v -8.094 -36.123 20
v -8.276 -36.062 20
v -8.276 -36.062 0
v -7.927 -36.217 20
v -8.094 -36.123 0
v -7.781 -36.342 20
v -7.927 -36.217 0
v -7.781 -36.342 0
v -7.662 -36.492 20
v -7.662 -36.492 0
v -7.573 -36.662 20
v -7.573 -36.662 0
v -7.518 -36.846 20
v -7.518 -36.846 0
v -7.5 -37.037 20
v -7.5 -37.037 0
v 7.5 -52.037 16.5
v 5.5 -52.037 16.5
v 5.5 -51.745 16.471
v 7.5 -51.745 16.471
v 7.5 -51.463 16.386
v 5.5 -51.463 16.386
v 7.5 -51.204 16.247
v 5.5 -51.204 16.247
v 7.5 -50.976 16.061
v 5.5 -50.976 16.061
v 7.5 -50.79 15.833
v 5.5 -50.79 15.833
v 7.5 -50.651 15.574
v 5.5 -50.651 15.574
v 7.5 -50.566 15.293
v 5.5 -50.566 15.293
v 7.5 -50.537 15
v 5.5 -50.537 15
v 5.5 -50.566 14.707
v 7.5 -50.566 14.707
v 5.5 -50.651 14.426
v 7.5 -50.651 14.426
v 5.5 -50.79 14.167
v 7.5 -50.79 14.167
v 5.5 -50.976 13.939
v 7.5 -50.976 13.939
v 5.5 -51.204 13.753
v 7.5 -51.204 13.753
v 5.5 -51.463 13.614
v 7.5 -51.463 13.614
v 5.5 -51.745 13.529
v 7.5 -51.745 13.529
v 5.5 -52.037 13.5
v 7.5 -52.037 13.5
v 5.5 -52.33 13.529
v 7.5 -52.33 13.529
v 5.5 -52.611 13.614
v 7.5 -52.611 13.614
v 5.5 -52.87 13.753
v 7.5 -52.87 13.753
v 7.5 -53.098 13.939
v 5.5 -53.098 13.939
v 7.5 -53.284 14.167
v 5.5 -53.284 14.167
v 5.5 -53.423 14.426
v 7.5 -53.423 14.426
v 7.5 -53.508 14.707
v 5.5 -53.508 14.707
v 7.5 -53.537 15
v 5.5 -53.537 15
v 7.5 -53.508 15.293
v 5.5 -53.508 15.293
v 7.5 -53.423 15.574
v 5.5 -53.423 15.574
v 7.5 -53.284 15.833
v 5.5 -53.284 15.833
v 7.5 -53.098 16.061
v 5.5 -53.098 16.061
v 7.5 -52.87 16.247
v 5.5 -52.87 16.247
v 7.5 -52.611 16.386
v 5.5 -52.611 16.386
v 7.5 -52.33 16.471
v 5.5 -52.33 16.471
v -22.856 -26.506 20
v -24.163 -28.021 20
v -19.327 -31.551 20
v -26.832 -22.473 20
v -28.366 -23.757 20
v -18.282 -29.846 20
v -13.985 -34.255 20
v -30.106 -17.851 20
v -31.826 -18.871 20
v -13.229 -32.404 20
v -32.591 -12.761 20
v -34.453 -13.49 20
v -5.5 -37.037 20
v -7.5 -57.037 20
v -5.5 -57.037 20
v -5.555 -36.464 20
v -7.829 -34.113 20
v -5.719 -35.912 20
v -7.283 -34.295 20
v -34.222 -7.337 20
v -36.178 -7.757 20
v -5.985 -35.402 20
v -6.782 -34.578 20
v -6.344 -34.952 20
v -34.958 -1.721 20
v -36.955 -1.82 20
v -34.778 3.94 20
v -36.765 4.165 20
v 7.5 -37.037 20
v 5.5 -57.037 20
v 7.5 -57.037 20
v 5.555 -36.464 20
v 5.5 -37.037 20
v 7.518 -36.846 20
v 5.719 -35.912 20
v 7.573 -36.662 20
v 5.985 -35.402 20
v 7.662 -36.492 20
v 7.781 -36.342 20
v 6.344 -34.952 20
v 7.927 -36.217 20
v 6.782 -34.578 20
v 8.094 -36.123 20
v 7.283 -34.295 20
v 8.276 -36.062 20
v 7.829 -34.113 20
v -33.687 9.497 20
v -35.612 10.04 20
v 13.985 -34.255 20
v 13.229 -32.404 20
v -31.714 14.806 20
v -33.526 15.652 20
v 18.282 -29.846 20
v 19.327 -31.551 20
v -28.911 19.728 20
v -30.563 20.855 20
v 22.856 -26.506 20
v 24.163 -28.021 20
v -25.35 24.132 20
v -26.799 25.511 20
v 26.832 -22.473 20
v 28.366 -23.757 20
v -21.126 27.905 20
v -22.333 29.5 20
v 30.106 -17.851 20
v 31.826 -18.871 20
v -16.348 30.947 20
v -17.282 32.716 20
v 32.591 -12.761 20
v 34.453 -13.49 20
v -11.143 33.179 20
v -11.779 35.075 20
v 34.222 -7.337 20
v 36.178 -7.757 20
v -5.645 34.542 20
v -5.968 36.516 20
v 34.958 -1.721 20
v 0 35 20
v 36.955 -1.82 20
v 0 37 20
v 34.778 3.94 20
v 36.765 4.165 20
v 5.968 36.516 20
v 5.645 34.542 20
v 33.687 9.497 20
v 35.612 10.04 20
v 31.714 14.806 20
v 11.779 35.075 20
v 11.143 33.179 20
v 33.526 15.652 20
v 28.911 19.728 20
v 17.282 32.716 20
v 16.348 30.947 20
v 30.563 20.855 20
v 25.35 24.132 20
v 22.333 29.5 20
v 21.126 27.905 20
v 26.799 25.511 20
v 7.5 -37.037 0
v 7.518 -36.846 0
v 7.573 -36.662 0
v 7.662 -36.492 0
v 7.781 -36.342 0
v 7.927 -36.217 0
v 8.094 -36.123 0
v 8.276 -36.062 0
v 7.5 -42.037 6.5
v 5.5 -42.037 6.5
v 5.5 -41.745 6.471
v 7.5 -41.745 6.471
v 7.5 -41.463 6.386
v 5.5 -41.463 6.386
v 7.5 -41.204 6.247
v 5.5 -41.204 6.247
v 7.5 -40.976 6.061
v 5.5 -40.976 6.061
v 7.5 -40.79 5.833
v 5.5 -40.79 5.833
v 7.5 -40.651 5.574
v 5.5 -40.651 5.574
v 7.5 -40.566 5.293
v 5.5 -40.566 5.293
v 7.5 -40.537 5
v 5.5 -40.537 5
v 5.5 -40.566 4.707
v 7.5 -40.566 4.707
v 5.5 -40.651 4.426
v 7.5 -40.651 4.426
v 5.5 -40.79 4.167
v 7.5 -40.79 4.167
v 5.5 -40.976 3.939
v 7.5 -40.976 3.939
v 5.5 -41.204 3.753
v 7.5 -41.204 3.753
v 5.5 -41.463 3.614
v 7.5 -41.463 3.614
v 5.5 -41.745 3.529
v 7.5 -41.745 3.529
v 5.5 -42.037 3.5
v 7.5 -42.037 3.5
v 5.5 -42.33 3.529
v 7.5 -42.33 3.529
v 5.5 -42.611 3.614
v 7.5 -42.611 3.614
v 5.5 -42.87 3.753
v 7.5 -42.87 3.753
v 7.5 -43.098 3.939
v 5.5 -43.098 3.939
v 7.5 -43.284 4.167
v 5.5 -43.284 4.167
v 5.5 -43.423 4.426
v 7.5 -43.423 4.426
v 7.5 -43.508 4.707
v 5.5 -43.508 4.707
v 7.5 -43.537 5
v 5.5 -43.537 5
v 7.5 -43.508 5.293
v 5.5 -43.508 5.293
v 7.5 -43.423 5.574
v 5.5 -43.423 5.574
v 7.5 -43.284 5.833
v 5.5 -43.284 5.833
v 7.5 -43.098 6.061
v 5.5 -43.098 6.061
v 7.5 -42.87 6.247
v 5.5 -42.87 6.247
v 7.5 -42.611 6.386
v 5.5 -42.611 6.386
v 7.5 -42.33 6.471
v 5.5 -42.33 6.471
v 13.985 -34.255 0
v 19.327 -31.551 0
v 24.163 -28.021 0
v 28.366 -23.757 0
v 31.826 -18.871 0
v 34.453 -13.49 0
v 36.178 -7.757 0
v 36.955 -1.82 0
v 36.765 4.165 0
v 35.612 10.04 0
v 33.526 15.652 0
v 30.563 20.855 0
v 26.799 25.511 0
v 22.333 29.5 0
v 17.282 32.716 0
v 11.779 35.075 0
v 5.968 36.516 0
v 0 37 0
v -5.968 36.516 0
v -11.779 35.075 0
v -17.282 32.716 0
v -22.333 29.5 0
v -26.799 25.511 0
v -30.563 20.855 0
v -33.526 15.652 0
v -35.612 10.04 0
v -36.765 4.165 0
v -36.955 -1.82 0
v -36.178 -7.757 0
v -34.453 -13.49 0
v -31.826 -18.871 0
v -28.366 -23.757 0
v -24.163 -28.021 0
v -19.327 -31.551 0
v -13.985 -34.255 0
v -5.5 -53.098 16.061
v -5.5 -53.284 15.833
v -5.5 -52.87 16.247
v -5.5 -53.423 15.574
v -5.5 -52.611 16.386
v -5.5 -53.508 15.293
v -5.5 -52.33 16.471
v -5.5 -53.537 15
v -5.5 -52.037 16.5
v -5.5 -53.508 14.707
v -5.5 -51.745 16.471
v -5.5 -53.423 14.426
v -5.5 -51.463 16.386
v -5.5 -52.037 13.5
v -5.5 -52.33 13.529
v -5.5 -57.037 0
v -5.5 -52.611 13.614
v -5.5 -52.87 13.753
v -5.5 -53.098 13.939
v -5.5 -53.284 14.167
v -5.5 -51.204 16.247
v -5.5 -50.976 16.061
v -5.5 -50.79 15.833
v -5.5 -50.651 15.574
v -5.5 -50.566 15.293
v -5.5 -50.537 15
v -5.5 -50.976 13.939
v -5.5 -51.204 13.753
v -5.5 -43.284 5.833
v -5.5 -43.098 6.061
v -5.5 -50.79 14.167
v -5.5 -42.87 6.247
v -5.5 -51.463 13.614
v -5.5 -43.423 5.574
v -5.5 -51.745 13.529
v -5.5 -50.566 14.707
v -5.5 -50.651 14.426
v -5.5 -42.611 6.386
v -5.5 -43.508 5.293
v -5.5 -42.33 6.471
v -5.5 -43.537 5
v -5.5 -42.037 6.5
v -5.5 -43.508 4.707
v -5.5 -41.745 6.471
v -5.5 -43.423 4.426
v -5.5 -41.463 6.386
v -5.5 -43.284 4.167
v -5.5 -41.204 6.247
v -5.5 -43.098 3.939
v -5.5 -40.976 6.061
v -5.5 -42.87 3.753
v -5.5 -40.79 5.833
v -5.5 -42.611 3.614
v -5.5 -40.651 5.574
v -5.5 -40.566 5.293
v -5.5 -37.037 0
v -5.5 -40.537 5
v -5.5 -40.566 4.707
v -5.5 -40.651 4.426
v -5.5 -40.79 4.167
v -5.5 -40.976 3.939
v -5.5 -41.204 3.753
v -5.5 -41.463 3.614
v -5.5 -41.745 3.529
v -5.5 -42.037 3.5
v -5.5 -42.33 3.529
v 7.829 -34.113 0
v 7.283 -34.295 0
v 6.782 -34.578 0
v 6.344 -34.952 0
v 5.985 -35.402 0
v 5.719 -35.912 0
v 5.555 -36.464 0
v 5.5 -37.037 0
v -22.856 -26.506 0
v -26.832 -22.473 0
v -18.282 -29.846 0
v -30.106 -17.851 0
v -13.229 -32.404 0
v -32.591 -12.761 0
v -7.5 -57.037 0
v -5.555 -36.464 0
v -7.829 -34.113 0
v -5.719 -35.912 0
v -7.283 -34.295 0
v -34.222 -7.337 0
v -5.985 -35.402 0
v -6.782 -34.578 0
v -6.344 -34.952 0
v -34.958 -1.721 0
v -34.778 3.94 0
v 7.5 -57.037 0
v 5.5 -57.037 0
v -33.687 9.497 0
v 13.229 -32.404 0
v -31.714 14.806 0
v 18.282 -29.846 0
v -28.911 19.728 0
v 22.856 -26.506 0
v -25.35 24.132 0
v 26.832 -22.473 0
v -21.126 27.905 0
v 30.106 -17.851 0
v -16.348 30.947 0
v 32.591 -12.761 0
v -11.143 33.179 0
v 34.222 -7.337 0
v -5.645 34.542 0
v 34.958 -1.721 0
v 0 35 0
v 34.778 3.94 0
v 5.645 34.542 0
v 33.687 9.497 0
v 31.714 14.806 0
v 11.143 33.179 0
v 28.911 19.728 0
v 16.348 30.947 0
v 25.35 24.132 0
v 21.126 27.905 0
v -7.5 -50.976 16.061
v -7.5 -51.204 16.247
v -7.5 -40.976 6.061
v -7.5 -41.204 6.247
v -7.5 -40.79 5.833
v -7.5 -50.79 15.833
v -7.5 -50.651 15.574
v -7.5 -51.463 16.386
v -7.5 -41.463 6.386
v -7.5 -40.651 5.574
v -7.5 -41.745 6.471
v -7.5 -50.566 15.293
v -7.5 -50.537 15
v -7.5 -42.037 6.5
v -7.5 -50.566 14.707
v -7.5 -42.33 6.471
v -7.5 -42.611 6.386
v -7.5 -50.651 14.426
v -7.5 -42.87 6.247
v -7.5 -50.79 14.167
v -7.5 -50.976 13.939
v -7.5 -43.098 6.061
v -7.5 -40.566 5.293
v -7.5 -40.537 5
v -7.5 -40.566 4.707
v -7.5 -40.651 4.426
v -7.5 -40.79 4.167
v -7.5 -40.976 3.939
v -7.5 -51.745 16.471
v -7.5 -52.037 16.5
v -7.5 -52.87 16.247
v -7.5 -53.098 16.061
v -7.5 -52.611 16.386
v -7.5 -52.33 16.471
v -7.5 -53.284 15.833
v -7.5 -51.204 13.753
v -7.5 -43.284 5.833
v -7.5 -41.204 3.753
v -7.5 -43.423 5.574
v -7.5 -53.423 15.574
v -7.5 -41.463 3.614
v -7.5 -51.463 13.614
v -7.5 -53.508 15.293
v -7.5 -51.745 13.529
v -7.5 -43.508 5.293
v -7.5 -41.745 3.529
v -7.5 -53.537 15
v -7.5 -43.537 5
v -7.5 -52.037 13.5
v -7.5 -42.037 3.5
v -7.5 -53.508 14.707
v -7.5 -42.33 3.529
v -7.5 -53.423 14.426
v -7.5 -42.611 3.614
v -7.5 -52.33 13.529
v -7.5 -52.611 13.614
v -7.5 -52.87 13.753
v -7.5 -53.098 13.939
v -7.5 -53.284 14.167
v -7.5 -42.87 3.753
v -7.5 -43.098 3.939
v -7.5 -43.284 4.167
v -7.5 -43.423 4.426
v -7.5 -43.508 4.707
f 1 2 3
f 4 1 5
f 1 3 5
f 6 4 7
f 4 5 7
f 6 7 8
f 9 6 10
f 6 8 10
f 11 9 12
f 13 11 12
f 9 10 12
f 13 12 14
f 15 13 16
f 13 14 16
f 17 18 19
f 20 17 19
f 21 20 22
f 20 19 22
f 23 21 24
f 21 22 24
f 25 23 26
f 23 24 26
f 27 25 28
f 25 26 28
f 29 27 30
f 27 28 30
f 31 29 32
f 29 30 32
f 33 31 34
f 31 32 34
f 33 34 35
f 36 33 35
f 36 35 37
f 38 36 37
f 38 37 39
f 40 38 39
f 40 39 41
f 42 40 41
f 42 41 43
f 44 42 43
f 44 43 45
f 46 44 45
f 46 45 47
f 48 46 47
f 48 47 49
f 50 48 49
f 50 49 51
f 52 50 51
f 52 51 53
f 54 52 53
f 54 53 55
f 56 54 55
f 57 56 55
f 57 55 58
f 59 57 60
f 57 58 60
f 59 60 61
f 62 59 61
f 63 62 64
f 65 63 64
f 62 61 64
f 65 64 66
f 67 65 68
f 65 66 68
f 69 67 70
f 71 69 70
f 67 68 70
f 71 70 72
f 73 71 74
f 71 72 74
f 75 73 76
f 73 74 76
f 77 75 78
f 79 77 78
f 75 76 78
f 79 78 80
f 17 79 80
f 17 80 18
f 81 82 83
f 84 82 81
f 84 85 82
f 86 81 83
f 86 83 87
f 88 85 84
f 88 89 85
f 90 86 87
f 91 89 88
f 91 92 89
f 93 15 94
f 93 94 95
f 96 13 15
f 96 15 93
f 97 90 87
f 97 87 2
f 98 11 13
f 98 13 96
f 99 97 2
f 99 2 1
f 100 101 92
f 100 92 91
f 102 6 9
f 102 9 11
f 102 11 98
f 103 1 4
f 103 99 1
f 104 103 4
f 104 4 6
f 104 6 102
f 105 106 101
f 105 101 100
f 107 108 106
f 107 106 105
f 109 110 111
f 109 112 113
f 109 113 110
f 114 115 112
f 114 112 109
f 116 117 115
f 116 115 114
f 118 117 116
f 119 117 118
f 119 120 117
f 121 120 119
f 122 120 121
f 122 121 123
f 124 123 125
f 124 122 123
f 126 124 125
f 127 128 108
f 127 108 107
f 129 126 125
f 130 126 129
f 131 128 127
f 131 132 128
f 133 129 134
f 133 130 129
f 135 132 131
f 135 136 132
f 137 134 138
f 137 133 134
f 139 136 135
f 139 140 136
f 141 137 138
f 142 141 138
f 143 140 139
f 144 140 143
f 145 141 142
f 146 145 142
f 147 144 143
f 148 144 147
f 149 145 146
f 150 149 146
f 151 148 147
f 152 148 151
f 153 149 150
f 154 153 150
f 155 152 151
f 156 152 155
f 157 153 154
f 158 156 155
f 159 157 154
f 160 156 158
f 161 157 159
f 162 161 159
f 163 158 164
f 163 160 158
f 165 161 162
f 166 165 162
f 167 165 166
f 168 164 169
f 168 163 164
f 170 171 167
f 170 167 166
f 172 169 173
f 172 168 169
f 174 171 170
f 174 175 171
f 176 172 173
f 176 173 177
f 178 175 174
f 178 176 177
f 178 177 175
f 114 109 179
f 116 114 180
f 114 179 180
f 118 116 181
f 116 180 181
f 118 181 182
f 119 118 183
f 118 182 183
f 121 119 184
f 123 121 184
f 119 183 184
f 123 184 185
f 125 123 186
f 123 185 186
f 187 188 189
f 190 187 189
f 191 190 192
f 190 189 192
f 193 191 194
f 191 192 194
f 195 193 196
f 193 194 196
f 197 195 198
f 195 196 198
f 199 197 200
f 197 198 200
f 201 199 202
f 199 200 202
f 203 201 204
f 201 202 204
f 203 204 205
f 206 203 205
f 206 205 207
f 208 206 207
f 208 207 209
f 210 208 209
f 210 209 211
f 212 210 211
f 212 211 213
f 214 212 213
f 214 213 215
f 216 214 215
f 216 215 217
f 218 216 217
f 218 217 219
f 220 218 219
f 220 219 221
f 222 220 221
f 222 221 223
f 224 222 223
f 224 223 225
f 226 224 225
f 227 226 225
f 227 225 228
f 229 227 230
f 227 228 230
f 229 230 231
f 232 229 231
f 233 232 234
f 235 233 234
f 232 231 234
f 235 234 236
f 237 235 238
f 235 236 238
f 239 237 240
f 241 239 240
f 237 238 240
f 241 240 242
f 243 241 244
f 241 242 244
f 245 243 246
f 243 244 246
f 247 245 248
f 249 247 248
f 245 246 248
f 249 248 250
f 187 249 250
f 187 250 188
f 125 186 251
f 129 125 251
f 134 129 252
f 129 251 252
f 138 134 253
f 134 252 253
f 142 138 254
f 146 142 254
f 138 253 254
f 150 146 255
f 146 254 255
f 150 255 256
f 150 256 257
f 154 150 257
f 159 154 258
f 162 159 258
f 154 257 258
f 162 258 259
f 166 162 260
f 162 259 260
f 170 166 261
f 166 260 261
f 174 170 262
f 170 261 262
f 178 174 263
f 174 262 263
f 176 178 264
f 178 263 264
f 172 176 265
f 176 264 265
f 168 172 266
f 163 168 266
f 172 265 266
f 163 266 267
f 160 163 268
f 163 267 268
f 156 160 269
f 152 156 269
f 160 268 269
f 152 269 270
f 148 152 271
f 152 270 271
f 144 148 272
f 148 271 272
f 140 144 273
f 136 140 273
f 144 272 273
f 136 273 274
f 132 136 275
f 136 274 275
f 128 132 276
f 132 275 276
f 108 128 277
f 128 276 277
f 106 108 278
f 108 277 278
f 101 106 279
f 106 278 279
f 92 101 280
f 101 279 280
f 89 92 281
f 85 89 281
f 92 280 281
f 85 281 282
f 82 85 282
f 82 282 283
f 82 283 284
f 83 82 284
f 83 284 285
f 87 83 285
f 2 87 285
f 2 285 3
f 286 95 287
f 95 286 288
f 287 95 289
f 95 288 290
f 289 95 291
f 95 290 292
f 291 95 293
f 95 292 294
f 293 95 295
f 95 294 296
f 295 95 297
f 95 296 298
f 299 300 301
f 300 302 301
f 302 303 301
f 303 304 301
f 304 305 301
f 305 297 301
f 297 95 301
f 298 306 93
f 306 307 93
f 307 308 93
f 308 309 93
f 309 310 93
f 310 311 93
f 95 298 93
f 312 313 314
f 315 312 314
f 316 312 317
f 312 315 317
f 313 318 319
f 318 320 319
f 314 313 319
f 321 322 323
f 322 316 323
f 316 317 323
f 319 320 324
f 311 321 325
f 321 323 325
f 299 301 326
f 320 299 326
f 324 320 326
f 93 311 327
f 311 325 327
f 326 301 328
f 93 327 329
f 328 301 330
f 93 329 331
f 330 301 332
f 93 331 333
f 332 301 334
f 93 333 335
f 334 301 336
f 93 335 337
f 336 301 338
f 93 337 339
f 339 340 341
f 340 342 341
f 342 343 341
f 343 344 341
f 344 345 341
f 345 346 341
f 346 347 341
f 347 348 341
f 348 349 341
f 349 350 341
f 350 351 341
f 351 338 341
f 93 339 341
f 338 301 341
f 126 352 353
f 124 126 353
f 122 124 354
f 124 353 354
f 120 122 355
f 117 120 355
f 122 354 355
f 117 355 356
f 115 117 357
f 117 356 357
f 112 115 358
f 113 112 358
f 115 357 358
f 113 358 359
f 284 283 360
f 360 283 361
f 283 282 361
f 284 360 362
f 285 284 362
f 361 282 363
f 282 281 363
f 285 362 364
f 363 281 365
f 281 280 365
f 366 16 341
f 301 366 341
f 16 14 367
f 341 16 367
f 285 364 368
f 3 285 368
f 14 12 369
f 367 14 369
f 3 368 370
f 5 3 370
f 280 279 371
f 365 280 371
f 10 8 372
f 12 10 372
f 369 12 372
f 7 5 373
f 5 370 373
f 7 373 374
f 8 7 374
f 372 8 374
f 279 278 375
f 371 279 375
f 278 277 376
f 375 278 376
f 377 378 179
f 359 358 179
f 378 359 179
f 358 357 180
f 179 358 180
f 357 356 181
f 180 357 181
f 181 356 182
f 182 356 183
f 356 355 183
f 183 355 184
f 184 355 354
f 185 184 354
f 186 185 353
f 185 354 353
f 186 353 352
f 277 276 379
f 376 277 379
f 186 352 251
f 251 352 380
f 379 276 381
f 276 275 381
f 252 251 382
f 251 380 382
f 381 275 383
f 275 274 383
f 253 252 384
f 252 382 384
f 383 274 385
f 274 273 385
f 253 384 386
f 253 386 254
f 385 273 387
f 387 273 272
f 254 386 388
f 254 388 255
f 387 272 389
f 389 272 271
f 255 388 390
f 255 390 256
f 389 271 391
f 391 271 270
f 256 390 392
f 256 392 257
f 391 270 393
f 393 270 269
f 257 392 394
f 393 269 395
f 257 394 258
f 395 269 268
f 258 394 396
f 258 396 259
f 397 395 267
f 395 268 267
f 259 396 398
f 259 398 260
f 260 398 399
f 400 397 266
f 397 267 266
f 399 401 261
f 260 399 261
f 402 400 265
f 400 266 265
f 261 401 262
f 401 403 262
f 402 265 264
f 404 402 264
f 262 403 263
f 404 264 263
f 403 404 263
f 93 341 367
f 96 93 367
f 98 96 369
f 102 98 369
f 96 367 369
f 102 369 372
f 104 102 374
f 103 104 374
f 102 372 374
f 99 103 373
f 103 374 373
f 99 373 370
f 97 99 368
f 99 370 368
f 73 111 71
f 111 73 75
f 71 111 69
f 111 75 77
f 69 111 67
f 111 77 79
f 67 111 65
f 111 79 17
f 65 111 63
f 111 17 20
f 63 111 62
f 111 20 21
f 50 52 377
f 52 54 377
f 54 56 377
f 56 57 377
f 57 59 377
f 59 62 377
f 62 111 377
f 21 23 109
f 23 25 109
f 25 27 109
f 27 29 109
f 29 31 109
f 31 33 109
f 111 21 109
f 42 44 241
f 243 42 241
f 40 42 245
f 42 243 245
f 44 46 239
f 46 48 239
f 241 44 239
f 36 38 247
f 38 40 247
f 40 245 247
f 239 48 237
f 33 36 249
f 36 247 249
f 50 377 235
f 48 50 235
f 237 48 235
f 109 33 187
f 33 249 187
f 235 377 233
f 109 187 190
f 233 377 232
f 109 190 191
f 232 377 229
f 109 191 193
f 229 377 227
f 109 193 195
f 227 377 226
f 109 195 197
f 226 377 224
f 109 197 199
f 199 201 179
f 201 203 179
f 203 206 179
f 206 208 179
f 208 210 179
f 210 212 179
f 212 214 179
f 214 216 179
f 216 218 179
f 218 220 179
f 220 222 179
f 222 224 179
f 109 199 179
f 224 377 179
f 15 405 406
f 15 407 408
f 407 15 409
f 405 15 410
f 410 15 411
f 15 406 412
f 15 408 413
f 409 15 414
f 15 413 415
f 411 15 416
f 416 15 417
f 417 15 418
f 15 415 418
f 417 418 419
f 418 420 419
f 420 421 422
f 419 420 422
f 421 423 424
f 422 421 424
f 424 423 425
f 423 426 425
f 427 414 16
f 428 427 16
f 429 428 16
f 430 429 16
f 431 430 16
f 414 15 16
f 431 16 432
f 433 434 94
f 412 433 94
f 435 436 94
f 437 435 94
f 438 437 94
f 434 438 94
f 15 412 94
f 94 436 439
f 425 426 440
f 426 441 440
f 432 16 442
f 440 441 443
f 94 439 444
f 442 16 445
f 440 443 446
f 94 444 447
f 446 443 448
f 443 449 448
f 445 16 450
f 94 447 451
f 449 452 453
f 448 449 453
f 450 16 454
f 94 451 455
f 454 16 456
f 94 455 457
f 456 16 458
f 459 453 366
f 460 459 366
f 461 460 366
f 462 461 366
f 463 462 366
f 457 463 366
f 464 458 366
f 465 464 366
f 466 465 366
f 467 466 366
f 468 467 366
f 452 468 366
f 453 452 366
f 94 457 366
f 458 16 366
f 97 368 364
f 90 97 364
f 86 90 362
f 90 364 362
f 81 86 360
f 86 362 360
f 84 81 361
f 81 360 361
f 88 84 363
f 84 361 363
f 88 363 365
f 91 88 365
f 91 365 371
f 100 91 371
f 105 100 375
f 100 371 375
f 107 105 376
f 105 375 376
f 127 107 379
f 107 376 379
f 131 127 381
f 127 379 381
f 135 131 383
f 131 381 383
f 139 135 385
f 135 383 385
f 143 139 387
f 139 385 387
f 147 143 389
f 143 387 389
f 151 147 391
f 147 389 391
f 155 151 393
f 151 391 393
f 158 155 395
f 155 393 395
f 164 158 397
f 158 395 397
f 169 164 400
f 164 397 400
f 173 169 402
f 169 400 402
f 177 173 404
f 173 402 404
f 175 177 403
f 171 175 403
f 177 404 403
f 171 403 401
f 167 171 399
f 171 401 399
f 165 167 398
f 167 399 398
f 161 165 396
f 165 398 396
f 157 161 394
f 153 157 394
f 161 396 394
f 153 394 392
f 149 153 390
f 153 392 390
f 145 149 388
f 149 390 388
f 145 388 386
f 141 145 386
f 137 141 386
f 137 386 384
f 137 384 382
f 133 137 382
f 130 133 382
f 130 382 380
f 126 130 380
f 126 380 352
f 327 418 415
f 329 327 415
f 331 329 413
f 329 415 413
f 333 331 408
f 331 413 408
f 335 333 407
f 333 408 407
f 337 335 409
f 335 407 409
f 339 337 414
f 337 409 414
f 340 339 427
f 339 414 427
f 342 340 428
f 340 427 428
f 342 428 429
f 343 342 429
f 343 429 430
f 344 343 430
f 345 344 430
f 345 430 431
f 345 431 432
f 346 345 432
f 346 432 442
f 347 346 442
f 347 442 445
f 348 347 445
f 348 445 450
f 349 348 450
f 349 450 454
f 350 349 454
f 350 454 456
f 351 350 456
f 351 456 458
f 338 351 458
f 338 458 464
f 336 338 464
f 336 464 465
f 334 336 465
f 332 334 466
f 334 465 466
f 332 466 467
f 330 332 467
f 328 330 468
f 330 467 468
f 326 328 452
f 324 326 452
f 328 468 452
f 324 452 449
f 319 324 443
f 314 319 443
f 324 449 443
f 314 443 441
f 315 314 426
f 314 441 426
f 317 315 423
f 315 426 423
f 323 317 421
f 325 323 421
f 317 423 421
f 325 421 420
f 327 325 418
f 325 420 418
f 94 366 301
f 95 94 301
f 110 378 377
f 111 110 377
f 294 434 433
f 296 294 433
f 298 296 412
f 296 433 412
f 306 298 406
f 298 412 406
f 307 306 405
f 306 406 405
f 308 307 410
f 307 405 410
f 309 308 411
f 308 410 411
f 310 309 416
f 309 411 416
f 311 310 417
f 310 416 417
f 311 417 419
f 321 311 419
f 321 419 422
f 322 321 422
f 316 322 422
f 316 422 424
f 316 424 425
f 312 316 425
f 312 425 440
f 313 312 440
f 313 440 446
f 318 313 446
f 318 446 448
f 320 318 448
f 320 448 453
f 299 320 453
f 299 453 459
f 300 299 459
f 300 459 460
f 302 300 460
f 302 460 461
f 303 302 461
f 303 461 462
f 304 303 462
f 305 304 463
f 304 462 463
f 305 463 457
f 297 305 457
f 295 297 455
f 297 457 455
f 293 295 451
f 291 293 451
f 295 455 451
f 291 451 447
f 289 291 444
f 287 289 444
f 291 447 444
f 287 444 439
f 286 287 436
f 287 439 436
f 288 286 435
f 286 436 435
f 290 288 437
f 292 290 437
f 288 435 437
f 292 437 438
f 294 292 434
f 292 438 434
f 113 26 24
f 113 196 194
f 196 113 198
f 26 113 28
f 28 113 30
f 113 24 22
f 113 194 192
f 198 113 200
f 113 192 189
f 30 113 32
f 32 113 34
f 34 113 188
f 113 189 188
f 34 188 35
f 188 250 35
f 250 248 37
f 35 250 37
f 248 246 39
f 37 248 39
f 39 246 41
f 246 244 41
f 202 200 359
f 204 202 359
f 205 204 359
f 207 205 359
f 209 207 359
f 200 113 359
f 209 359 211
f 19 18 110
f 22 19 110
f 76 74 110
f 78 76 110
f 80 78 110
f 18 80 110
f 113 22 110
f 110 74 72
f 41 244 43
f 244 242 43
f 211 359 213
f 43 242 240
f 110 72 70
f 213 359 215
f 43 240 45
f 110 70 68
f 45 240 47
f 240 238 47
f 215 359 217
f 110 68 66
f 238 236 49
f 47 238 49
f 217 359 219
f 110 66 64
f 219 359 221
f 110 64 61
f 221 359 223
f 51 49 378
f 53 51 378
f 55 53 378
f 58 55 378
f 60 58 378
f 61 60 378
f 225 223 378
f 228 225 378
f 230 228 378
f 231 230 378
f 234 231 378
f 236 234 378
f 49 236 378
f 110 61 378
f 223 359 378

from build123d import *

# Parameters (mm, degrees)
EXTRUSION2_DEPTH = 20
ESQUISSE8_R      = 1.5
EXTRUSION3_DEPTH = 76.056550285
ESQUISSE9_R      = 1.5
EXTRUSION4_DEPTH = 76.056550285


with BuildPart() as part:
    # Esquisse7 → Extrusion2 (new body)
    with BuildSketch(Plane.XY):
        with BuildLine():
            Line((5.5, -57.037143518), (7.5, -57.037143518))
            Line((7.5, -57.037143518), (7.5, -37.037143518))
            ThreePointArc((7.5, -37.037143518), (7.717796634, -36.414120329), (8.276315789, -36.062481847))
            ThreePointArc((8.276315789, -36.062481847), (0, 37), (-8.276315789, -36.062481847))
            ThreePointArc((-8.276315789, -36.062481847), (-7.717796634, -36.414120329), (-7.5, -37.037143518))
            Line((-7.5, -37.037143518), (-7.5, -57.037143518))
            Line((-7.5, -57.037143518), (-5.5, -57.037143518))
            Line((-5.5, -57.037143518), (-5.5, -37.037143518))
            ThreePointArc((-5.5, -37.037143518), (-6.153389903, -35.16807395), (-7.828947368, -34.113158504))
            ThreePointArc((-7.828947368, -34.113158504), (0, 35), (7.828947368, -34.113158504))
            ThreePointArc((7.828947368, -34.113158504), (6.153389903, -35.16807395), (5.5, -37.037143518))
            Line((5.5, -37.037143518), (5.5, -57.037143518))
        make_face()
    extrude(amount=EXTRUSION2_DEPTH)

    # Esquisse8 → Extrusion3 (cut, through all)
    with BuildSketch(Plane.ZY.offset(7.5)):
        with Locations((15, -52.037143518)):
            Circle(ESQUISSE8_R)
    extrude(amount=-EXTRUSION3_DEPTH, mode=Mode.SUBTRACT)

    # Esquisse9 → Extrusion4 (cut, through all)
    with BuildSketch(Plane.ZY.offset(7.5)):
        with Locations((5, -42.037143518)):
            Circle(ESQUISSE9_R)
    extrude(amount=-EXTRUSION4_DEPTH, mode=Mode.SUBTRACT)


solid = part.part
